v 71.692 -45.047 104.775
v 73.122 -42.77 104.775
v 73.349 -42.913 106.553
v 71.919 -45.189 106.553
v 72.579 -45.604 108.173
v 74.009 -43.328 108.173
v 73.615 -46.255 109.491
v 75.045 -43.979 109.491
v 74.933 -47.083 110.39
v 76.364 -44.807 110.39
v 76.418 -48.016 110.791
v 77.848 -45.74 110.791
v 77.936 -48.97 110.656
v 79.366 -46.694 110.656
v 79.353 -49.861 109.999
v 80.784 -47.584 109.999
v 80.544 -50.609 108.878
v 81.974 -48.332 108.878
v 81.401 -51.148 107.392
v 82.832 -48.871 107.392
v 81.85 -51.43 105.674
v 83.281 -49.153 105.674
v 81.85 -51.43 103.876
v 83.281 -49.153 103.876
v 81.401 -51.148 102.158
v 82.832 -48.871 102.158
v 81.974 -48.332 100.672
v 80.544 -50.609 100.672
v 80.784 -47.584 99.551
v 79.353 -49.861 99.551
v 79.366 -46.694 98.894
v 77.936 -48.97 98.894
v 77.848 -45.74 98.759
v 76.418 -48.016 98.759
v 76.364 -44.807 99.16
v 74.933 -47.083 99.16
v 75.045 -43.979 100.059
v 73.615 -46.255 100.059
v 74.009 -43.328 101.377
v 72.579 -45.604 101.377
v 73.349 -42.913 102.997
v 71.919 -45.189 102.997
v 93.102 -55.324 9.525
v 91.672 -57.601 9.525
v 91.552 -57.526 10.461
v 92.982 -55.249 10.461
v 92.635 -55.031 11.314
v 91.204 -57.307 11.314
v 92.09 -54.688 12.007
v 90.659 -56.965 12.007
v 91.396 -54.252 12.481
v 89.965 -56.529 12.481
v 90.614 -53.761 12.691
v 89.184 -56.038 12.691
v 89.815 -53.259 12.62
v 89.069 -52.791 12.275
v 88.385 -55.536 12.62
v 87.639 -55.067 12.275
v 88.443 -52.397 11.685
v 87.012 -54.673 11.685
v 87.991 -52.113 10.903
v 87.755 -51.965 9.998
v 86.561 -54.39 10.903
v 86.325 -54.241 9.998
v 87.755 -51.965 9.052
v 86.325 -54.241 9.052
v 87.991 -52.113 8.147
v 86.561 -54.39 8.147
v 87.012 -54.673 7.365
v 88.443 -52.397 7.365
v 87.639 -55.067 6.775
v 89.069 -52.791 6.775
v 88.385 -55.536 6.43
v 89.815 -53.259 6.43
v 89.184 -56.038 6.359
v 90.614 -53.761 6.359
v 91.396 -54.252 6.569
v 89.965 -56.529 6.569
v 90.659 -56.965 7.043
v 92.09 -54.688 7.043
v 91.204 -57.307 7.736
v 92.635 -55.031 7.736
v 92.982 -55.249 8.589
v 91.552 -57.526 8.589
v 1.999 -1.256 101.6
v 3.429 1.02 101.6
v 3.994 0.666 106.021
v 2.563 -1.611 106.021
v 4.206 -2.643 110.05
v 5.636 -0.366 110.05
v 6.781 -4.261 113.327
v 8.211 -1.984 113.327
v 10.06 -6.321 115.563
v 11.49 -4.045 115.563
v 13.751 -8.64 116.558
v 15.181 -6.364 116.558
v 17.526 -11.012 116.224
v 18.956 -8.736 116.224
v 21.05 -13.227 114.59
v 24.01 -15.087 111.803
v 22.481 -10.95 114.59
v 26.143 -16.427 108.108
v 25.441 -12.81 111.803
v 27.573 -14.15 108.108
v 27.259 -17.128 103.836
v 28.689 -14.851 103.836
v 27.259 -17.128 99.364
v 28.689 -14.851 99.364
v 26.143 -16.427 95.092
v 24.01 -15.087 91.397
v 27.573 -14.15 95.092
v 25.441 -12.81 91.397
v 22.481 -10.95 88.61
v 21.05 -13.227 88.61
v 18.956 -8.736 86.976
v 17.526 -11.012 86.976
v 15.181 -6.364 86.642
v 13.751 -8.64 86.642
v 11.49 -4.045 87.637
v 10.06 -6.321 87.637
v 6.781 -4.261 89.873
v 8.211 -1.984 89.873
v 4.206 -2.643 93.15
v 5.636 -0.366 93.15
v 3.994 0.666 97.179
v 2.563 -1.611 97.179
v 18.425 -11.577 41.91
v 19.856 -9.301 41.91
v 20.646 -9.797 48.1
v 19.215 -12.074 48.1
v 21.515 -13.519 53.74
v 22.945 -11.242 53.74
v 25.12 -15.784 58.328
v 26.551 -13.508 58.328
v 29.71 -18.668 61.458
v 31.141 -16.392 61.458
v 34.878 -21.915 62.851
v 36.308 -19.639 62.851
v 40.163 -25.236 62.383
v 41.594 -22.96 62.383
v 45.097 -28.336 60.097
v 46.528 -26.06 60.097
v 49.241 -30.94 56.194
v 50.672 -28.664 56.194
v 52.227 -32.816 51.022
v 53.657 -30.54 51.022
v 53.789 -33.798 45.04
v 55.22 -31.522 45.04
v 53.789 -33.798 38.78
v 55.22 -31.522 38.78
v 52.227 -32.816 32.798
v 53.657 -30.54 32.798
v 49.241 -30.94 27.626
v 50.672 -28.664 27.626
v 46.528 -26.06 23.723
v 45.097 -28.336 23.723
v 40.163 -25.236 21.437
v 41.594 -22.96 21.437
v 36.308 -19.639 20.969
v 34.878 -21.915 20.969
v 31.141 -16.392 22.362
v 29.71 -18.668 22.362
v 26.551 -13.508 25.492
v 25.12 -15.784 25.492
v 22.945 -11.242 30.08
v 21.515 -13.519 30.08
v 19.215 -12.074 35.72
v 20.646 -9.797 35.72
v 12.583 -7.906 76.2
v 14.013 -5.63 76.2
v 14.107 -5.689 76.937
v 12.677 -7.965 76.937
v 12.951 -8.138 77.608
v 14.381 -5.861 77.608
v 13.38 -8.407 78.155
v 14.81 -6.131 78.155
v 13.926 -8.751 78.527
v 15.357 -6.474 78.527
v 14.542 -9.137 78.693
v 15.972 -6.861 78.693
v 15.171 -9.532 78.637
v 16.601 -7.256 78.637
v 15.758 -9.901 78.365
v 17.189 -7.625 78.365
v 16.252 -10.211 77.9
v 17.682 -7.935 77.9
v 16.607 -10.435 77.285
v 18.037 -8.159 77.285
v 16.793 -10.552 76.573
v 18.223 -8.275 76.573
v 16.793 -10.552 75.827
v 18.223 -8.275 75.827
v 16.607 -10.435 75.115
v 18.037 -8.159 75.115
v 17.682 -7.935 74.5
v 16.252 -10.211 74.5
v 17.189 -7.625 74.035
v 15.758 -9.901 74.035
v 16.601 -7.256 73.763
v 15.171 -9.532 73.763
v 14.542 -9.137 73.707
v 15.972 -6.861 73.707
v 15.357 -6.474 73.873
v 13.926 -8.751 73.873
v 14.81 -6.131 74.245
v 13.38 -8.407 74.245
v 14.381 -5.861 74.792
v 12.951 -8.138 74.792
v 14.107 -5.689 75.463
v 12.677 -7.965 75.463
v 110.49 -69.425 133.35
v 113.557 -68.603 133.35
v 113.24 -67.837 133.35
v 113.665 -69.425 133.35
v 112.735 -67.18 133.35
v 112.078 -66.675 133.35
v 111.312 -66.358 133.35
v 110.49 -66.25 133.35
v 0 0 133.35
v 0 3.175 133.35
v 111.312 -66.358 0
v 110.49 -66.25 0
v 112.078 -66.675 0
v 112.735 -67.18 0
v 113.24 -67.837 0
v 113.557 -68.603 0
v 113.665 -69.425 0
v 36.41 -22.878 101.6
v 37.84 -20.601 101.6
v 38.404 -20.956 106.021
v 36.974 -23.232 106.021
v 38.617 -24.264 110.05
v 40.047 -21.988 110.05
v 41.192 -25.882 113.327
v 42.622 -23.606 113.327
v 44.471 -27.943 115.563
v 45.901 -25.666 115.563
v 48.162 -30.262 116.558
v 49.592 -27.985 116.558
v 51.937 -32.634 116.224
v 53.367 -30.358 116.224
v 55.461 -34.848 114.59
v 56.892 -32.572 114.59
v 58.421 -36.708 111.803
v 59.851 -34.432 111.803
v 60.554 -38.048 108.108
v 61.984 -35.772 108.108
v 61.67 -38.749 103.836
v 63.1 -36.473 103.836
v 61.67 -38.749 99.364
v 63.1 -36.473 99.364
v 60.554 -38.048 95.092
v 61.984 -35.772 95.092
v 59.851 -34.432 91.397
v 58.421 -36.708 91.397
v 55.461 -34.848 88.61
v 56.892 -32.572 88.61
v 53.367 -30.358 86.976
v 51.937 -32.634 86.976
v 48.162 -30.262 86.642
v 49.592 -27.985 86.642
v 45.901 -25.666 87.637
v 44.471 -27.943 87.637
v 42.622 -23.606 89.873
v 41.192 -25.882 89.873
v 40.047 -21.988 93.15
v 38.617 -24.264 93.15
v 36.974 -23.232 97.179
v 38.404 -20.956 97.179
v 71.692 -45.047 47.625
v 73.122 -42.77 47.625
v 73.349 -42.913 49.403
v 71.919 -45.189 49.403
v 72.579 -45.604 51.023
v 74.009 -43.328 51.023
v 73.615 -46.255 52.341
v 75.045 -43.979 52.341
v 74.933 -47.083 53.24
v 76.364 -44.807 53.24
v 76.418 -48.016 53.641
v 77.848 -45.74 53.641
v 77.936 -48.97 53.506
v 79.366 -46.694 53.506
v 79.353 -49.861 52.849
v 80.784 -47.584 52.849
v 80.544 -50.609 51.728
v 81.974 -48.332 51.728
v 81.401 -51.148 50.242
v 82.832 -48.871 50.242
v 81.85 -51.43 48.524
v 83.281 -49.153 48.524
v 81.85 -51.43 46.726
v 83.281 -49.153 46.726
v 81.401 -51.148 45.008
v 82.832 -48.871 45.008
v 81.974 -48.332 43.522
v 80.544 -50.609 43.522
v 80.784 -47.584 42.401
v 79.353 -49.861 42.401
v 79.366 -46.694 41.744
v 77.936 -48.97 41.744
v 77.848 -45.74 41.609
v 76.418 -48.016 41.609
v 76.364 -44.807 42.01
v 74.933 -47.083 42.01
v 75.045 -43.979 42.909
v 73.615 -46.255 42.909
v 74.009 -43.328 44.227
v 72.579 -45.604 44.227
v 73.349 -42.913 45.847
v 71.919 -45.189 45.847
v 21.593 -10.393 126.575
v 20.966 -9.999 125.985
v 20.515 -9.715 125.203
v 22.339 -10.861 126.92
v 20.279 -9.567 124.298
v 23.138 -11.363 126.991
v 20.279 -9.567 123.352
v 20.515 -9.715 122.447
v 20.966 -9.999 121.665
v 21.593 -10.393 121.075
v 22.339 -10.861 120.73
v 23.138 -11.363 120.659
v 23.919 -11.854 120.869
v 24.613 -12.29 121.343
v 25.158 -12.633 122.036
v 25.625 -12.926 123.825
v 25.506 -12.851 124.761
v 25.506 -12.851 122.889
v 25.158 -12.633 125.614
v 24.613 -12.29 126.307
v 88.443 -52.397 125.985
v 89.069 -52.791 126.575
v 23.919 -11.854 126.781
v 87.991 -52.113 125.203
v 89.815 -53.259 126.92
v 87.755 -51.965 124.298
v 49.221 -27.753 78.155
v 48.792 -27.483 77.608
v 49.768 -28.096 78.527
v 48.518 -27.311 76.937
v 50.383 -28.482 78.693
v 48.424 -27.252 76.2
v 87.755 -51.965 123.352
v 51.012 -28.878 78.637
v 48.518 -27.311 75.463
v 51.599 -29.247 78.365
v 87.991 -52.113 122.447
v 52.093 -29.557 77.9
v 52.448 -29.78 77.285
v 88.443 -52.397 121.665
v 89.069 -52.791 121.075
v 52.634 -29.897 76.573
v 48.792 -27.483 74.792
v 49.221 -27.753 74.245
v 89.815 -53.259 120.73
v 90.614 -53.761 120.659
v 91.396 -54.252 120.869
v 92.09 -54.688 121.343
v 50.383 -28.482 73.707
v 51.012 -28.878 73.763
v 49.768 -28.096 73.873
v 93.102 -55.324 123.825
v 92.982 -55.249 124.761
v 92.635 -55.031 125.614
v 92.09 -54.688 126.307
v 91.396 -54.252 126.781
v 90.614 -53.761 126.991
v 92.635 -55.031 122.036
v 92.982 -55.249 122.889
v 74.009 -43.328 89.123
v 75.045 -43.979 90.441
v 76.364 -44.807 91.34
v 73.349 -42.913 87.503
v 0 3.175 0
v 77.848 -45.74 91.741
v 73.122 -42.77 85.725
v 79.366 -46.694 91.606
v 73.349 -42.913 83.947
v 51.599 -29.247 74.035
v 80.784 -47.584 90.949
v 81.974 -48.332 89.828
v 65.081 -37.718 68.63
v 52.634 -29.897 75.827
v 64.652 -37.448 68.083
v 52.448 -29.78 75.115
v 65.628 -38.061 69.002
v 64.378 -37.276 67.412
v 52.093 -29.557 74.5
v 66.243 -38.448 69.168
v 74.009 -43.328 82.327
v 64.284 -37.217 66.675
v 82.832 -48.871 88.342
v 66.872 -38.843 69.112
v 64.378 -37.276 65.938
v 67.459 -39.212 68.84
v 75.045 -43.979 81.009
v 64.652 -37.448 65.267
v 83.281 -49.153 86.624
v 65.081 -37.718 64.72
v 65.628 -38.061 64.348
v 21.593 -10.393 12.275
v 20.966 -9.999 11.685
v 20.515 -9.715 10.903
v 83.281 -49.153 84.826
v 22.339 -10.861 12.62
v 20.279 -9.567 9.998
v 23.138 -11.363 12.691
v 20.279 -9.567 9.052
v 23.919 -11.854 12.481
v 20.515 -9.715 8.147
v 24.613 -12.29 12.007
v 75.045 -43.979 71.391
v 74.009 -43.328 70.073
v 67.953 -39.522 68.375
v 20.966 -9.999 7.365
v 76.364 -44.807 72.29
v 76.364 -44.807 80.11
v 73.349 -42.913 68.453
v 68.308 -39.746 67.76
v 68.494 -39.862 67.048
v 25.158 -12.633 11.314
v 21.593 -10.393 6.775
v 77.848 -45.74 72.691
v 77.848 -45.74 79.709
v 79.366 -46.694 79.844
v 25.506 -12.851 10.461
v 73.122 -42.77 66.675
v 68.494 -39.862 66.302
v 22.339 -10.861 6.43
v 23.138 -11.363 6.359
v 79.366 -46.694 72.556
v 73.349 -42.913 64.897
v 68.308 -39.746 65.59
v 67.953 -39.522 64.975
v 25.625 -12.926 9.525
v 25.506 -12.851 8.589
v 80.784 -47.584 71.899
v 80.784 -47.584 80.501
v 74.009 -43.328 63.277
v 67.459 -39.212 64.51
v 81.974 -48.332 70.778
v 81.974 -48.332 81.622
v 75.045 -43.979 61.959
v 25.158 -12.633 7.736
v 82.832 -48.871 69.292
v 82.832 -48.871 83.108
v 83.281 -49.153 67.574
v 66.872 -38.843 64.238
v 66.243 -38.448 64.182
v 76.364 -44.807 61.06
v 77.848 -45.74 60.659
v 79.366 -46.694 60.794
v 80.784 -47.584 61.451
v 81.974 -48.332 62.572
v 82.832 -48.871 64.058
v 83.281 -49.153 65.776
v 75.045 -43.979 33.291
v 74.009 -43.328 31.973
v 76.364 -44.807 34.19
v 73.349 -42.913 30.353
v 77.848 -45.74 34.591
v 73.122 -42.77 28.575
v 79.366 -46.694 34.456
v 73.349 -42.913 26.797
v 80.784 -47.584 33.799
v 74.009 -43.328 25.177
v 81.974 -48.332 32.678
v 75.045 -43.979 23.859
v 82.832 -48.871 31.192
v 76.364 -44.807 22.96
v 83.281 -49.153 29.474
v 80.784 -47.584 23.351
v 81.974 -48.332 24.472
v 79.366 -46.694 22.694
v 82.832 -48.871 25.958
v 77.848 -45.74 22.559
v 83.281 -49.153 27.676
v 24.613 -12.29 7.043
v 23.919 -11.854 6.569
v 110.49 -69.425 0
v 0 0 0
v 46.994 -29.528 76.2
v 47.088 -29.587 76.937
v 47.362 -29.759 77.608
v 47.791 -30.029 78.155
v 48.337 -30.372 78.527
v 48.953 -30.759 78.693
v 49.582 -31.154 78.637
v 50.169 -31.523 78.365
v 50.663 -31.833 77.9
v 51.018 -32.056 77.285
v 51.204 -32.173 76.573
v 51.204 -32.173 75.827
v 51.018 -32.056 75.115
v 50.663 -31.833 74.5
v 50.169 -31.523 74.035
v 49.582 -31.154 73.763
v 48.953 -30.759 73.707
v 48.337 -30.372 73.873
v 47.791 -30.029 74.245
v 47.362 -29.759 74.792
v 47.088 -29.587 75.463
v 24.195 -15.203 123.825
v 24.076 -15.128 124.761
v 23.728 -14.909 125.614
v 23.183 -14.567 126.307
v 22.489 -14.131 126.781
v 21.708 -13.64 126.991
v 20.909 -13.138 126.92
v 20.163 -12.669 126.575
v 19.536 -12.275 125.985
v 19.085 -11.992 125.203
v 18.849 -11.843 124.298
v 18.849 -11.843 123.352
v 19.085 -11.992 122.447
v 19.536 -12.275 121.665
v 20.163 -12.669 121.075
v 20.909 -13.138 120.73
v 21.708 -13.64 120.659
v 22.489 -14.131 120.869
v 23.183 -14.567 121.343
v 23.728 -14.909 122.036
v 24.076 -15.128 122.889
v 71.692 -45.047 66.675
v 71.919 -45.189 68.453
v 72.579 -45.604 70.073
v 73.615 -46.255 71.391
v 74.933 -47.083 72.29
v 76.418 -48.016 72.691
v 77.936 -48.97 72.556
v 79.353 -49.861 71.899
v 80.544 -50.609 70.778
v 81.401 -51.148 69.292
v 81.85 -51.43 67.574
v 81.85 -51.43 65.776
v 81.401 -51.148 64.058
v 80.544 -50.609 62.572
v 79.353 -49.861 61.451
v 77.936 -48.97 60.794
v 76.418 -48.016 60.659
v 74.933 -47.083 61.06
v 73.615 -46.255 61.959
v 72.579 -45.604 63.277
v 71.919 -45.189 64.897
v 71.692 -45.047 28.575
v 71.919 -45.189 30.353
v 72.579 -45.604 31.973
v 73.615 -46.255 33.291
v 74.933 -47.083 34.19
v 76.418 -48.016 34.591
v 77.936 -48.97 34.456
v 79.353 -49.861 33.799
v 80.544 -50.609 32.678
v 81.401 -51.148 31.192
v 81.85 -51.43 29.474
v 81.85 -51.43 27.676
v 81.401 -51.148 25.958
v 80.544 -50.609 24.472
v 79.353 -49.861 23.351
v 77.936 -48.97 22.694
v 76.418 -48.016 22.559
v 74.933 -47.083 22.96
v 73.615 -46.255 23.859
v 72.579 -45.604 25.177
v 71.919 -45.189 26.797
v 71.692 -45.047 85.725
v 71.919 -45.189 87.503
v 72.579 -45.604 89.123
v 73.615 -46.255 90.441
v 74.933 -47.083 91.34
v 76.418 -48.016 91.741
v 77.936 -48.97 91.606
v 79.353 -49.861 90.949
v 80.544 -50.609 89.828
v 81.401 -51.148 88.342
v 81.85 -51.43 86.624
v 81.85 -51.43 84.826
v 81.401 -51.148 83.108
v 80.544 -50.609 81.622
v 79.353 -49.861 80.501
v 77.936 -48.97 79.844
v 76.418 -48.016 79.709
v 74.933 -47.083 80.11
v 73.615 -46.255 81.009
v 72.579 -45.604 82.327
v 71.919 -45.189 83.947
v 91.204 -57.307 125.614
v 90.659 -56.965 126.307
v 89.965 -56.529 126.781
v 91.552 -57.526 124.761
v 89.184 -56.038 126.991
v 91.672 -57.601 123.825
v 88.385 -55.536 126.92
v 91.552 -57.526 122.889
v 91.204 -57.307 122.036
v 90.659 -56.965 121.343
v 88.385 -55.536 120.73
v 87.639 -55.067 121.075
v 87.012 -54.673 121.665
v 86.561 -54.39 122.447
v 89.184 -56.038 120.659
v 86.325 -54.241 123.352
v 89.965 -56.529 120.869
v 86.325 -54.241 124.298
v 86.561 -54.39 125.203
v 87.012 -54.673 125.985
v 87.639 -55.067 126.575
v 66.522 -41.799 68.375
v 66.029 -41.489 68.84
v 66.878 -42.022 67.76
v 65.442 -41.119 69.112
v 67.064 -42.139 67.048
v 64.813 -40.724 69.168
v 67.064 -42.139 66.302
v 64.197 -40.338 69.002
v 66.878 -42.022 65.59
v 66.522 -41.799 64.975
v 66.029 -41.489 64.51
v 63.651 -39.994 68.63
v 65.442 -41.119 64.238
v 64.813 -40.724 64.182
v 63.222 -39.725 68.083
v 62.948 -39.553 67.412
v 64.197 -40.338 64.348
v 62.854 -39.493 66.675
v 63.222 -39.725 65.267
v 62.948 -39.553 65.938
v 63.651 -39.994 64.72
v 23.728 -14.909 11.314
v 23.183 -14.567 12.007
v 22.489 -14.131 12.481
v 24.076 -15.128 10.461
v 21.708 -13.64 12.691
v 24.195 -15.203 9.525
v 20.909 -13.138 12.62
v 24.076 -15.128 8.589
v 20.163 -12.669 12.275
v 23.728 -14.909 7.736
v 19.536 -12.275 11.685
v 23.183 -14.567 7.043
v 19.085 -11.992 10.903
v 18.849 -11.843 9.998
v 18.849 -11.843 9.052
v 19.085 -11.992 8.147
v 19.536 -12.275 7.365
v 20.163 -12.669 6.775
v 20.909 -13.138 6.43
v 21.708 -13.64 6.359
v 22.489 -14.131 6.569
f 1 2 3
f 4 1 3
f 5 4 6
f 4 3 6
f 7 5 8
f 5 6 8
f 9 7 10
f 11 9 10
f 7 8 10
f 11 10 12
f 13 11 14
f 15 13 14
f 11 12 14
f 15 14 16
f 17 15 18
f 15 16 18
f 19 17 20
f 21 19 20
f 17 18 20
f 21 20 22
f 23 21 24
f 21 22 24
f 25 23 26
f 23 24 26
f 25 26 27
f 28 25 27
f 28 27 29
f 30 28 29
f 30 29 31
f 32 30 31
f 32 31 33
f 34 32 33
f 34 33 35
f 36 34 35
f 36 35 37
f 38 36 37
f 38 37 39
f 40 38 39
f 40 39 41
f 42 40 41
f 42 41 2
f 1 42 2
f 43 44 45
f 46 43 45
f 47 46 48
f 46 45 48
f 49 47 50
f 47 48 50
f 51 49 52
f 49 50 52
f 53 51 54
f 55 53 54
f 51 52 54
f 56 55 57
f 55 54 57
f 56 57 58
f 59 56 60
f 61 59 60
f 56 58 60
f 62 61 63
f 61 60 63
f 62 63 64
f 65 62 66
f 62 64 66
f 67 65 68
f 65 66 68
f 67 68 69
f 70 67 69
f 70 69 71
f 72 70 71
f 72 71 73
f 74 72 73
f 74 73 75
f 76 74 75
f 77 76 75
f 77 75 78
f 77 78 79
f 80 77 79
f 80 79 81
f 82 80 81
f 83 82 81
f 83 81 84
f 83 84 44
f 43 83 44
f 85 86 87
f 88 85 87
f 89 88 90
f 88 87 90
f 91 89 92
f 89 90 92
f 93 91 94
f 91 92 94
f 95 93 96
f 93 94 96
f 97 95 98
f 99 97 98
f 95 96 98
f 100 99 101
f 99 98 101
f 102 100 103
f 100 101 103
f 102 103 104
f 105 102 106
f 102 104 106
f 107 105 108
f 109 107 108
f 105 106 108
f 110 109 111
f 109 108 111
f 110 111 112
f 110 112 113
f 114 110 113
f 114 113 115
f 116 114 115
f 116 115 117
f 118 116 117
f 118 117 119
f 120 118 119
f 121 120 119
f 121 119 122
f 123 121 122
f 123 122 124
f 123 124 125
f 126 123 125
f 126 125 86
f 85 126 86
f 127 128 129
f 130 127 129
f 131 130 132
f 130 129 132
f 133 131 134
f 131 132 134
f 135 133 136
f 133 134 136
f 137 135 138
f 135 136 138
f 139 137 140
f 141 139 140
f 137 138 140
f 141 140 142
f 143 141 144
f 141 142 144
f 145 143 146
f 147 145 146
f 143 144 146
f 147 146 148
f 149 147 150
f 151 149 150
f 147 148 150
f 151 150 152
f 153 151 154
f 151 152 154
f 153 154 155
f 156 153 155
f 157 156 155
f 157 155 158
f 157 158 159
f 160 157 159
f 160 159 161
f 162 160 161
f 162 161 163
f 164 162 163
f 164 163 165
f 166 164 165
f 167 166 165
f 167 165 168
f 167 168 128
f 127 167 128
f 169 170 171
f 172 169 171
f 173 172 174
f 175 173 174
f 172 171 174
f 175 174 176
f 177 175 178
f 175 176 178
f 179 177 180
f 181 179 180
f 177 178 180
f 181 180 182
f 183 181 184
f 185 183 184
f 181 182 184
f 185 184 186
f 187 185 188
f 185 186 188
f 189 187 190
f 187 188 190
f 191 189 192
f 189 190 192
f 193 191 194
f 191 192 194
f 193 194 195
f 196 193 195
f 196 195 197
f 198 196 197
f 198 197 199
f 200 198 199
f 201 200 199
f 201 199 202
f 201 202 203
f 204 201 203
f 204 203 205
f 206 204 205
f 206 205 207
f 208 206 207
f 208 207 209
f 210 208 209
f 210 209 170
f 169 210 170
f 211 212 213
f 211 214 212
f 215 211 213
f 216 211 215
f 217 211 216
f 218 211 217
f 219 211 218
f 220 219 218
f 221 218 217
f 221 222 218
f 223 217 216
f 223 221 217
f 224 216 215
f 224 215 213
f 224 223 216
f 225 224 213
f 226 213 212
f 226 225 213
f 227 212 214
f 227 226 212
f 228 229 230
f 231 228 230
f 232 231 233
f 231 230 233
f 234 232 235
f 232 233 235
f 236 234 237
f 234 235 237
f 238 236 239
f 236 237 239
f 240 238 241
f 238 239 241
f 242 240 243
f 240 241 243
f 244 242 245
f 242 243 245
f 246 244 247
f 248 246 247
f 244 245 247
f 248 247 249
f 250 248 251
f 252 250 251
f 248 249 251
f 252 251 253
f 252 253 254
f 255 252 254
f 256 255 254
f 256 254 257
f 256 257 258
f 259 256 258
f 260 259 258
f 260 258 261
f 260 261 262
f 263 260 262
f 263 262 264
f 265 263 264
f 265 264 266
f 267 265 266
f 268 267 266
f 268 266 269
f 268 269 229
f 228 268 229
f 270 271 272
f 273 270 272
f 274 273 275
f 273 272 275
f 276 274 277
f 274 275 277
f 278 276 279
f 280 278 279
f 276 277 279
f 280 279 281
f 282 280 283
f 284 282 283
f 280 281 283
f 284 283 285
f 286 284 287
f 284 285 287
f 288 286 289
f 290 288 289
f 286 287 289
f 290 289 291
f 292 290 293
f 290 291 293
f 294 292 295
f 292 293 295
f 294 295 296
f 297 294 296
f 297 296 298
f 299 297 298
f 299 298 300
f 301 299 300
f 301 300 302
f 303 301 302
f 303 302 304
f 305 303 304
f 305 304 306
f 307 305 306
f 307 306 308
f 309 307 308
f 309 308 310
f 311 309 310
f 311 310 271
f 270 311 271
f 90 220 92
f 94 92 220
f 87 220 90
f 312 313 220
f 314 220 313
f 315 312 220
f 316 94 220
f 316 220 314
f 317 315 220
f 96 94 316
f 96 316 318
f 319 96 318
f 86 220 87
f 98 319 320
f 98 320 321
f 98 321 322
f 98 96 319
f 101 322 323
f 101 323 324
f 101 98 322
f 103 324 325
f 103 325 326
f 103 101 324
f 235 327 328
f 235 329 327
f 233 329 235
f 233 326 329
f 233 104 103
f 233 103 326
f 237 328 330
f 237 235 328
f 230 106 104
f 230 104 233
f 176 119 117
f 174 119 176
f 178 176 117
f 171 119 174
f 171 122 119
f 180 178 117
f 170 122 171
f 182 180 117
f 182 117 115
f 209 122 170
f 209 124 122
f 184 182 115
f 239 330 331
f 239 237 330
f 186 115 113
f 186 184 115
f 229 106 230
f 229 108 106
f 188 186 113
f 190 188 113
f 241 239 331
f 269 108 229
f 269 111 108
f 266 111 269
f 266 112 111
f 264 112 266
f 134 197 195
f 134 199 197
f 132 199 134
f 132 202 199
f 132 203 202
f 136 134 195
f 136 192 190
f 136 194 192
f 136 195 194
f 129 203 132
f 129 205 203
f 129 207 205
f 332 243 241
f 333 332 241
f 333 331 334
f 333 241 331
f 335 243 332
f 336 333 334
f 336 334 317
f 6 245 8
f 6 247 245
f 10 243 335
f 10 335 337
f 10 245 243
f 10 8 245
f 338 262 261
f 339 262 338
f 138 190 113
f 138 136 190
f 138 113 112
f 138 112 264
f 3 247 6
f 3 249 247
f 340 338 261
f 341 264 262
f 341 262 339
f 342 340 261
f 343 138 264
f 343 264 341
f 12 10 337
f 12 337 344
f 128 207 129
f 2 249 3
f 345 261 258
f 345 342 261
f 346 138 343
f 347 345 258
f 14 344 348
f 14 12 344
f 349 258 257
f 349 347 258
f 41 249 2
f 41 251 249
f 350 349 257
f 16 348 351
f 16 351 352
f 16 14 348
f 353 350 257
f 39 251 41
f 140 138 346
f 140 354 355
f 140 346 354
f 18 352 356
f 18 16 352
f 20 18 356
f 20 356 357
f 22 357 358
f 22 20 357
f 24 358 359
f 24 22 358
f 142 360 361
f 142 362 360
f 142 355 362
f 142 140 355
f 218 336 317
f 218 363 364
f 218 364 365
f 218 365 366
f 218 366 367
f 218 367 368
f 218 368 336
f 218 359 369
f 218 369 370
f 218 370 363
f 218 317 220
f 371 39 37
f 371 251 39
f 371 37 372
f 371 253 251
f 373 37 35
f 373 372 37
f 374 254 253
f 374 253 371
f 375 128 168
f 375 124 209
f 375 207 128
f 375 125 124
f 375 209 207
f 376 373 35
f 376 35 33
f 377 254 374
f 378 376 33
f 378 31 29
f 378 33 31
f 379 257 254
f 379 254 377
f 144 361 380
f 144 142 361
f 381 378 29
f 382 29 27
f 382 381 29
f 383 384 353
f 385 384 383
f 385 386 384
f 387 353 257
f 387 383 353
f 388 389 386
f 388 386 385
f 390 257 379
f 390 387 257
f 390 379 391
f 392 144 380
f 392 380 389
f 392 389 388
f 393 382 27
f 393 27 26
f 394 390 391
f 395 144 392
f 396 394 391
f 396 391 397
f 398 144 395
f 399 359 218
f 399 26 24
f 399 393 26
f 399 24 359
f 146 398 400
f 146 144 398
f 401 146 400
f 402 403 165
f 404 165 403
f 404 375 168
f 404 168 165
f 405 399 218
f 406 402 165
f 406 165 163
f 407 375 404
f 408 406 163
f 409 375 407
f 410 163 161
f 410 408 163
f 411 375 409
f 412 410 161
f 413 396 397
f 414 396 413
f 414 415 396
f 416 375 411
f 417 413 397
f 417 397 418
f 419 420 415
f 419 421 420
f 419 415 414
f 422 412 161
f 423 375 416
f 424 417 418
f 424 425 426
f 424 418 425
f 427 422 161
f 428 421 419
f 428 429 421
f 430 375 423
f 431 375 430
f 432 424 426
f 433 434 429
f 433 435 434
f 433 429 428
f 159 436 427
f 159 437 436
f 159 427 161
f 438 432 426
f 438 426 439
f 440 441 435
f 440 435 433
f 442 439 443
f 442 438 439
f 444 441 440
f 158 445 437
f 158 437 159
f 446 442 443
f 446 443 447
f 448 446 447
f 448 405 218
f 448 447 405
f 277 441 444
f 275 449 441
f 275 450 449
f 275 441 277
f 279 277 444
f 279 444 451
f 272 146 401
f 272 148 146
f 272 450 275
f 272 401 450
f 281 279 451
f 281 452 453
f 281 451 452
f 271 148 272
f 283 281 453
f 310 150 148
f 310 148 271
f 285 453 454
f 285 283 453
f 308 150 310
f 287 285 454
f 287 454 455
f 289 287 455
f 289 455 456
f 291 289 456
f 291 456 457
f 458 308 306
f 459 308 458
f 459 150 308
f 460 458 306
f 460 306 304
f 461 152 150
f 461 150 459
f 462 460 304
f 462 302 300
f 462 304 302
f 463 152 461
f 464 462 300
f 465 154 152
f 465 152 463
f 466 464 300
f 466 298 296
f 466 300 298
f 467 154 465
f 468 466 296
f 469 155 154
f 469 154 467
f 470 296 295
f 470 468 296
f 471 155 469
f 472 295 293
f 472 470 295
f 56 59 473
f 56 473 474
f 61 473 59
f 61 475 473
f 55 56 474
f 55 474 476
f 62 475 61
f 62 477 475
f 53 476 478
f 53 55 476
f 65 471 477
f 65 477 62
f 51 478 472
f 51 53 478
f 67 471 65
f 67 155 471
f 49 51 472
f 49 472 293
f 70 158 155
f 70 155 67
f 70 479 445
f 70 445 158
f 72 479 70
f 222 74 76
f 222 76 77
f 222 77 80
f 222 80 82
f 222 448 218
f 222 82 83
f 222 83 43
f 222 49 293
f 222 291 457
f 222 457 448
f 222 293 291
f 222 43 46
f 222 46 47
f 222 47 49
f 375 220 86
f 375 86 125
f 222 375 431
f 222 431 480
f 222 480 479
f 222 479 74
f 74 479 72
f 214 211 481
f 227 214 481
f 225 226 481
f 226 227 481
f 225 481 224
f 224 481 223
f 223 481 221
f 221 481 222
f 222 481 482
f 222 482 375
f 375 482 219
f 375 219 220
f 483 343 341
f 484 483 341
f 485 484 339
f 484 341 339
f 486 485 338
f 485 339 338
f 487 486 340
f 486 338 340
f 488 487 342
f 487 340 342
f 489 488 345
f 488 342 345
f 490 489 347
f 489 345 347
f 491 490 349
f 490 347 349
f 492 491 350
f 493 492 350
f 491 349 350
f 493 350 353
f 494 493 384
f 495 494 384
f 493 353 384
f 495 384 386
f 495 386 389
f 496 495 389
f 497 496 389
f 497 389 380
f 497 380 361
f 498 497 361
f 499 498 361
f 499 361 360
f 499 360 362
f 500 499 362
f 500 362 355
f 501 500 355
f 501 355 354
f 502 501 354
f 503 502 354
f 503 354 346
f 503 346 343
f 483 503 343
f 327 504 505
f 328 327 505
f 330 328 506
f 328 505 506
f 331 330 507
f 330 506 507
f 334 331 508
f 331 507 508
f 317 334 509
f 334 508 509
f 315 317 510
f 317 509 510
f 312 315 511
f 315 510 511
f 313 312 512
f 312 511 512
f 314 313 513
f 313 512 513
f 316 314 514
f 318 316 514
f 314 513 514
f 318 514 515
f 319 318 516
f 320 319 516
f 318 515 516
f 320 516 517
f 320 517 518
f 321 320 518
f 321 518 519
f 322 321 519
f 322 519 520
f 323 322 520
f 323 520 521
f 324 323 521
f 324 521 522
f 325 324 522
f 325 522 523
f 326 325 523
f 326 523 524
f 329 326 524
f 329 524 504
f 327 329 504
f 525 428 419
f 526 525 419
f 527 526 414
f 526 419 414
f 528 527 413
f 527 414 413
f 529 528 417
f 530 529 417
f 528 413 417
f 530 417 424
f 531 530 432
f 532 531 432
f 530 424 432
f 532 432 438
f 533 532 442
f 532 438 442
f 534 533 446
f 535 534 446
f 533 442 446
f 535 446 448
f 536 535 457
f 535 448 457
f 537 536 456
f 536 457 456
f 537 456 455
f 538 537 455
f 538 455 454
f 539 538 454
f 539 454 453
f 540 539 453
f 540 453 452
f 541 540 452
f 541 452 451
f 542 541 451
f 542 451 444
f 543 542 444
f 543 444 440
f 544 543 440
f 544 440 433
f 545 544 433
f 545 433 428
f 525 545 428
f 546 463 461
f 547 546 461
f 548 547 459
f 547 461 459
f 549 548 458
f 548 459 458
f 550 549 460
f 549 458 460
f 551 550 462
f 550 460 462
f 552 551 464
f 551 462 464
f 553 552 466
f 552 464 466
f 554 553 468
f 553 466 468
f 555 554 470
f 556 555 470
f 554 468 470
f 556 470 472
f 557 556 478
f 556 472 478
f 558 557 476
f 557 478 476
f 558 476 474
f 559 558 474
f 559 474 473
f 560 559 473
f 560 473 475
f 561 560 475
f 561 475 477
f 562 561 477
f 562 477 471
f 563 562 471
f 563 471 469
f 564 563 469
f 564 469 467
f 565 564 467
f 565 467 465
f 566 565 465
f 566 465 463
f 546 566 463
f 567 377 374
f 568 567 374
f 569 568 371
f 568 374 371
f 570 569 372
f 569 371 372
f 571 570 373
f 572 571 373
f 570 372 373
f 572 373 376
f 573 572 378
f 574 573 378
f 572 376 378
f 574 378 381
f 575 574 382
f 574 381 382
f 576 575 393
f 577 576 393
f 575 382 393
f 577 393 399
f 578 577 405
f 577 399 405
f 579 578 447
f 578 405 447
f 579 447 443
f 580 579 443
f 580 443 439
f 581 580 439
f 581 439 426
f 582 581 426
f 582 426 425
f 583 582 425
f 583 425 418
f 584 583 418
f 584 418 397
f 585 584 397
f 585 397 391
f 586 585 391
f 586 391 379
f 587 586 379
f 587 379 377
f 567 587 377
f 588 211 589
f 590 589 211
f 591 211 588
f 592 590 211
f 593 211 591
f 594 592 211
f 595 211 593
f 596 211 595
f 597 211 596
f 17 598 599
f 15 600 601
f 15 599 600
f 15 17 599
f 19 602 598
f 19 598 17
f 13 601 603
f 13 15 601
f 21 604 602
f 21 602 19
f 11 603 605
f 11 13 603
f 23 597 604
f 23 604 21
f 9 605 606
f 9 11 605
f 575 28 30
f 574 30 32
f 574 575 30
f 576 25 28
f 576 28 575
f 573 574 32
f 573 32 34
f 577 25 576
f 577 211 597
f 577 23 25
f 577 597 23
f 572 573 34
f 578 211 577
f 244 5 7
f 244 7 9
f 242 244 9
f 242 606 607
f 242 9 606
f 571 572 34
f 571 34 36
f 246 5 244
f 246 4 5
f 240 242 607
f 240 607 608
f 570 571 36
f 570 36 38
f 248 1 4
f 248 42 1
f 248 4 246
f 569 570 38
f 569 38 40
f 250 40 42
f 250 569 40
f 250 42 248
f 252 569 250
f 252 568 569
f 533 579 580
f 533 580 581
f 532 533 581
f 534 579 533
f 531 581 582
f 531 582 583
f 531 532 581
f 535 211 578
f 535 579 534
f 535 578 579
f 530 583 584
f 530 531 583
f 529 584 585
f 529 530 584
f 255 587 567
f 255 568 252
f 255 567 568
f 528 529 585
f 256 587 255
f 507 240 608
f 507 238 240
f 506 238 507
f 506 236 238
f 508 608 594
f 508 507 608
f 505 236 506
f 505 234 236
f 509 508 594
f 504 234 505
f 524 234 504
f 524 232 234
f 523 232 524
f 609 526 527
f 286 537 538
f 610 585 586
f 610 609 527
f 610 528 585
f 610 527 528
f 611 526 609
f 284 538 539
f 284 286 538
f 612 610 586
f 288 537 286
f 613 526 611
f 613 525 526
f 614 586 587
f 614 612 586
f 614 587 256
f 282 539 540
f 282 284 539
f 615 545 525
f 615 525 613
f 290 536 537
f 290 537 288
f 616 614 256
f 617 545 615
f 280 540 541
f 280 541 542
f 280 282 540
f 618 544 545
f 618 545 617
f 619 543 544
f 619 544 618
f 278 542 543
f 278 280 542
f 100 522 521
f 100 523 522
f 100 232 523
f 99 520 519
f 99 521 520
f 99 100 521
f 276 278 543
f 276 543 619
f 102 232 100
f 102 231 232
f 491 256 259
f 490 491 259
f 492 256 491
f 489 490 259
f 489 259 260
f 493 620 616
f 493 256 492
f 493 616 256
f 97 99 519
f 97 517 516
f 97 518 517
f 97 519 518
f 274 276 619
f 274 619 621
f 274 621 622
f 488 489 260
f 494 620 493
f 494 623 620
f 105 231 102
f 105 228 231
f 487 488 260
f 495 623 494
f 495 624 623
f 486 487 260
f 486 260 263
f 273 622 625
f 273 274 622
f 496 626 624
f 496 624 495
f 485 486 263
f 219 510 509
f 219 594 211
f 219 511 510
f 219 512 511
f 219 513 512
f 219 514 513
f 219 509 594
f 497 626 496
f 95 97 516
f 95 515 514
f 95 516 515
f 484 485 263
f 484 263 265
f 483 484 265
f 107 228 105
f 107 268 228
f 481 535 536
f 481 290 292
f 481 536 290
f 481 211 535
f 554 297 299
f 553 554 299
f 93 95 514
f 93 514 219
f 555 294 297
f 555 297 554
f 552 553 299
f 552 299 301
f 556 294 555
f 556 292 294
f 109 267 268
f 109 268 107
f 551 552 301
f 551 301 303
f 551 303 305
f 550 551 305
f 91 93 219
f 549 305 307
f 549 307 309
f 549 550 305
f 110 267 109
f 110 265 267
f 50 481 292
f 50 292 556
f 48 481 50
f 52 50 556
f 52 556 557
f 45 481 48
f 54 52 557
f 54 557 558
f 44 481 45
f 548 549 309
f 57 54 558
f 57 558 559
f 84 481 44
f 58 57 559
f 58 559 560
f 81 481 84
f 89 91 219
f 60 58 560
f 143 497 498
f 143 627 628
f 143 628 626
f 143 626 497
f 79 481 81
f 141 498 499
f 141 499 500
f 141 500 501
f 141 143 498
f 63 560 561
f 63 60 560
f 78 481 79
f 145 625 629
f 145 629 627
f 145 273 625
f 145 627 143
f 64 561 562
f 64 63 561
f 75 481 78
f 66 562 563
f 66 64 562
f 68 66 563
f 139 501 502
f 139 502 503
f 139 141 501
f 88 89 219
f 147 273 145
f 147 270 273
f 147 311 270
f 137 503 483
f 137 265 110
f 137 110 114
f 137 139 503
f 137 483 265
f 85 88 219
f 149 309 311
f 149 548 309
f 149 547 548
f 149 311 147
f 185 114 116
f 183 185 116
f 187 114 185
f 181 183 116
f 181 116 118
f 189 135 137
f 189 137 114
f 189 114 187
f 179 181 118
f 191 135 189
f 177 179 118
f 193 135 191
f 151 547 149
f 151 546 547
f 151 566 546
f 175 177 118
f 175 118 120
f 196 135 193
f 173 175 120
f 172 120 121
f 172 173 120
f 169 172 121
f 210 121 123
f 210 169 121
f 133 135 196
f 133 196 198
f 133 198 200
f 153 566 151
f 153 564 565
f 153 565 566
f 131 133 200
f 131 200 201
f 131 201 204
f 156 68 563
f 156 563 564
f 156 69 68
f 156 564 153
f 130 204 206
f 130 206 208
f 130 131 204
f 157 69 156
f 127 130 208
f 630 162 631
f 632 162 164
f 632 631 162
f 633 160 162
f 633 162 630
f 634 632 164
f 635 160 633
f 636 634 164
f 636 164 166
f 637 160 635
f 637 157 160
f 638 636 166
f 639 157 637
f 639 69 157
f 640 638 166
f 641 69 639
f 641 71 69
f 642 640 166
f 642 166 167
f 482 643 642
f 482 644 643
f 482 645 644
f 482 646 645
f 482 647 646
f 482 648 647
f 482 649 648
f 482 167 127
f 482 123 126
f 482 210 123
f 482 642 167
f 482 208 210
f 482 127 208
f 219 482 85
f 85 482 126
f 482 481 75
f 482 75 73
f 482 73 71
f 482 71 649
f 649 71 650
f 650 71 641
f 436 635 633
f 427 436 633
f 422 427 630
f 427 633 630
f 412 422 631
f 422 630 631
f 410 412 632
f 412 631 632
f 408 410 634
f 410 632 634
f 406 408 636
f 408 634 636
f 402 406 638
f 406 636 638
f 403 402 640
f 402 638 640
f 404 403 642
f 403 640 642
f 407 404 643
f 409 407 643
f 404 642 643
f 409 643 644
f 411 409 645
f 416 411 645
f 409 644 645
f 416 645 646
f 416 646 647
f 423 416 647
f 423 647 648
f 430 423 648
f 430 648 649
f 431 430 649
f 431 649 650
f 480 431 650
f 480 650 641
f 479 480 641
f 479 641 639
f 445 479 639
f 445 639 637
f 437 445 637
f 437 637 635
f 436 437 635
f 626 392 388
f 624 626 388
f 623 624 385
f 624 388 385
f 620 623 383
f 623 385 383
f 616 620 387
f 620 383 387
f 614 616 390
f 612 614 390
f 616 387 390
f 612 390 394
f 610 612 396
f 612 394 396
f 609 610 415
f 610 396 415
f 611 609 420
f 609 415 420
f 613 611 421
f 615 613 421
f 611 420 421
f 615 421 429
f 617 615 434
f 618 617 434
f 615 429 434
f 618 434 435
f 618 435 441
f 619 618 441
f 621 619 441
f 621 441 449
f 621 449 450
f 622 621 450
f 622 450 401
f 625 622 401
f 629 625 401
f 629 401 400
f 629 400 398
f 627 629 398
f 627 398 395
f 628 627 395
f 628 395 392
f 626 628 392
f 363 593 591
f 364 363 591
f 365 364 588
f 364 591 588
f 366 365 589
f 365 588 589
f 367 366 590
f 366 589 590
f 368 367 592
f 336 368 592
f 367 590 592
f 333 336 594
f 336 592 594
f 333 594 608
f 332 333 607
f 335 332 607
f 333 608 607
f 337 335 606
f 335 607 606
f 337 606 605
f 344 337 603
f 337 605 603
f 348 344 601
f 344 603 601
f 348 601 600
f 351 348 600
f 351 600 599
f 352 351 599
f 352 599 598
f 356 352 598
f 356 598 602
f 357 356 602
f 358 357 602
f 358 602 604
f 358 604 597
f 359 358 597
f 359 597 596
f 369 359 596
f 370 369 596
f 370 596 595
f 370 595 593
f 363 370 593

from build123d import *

# Parameters (mm, degrees)
BOSS_EXTRUDE1_DEPTH = 133.35
SKETCH2_R           = 21
CUT_EXTRUDE1_DEPTH  = 187.593999065
SKETCH3_W           = 133.35
SKETCH3_H           = 3.175
BOSS_EXTRUDE2_DEPTH = 3.175
FILLET1_R           = 3.175
SKETCH5_R           = 15
CUT_EXTRUDE2_DEPTH  = 189.467318942
SKETCH6_R           = 6.0325
CUT_EXTRUDE3_DEPTH  = 189.467318942
SKETCH7_R           = 3.175
CUT_EXTRUDE4_DEPTH  = 189.472240296
SKETCH15_R          = 2.5
CUT_EXTRUDE8_DEPTH  = 189.467318942
SKETCH18_R          = 30.1625
SKETCH18_R_2        = 21
BOSS_EXTRUDE3_DEPTH = 2.688354466


with BuildPart() as part:
    # Sketch1 → Boss-Extrude1 (new body)
    with BuildSketch(Plane.XY):
        Polygon((110.49, -69.425000088), (0, 0), (0, 3.175), (110.49, -66.250000088), align=None)
    extrude(amount=BOSS_EXTRUDE1_DEPTH)

    # Sketch2 → Cut-Extrude1 (cut, through all)
    with BuildSketch(Plane(origin=(1.430283892, 2.276299128, 0), x_dir=(0.8467258159330607, -0.5320295035357462, 0), z_dir=(0.5320295035357462, 0.8467258159330607, 0))):
        with Locations(Location((42.760806326, -41.91, 0), (0, 0, 180))):
            Circle(SKETCH2_R)
    extrude(amount=-CUT_EXTRUDE1_DEPTH, mode=Mode.SUBTRACT)

    # Sketch3 → Boss-Extrude2 (add)
    with BuildSketch(Plane(origin=(110.49, 0, 0), x_dir=(0, 0, -1), z_dir=(1, 0, 0))):
        with Locations((-66.675, -67.837500088)):
            Rectangle(SKETCH3_W, SKETCH3_H)
    extrude(amount=BOSS_EXTRUDE2_DEPTH)

    # Fillet1
    fillet1_edges = [part.edges().sort_by_distance(p)[0] for p in [
        (113.665, -66.250000088, 66.675),
    ]]
    fillet(fillet1_edges, radius=FILLET1_R - 0.0001)  # a hair under: the kernel refuses the full size

    # Sketch5 → Cut-Extrude2 (cut, through all)
    with BuildSketch(Plane(origin=(1.430283892, 2.276299128, 0), x_dir=(0.8467258159330606, -0.5320295035357464, 0), z_dir=(0.5320295035357464, 0.8467258159330606, 0))):
        with Locations(Location((17.360806326, -101.6, 0), (0, 0, 180))):
            Circle(SKETCH5_R)
        with Locations(Location((58.000806326, -101.6, 0), (0, 0, 180))):
            Circle(SKETCH5_R)
    extrude(amount=-CUT_EXTRUDE2_DEPTH, mode=Mode.SUBTRACT)

    # Sketch6 → Cut-Extrude3 (cut, through all)
    with BuildSketch(Plane(origin=(1.430283892, 2.276299128, 0), x_dir=(0.8467258159330606, -0.5320295035357464, 0), z_dir=(0.5320295035357464, 0.8467258159330606, 0))):
        with Locations(Location((90.701690059, -66.675, 0), (0, 0, 180))):
            Circle(SKETCH6_R)
        with Locations(Location((90.701690059, -47.625, 0), (0, 0, 180))):
            Circle(SKETCH6_R)
        with Locations(Location((90.701690059, -28.575, 0), (0, 0, 180))):
            Circle(SKETCH6_R)
        with Locations(Location((90.701690059, -85.725, 0), (0, 0, 180))):
            Circle(SKETCH6_R)
        with Locations(Location((90.701690059, -104.775, 0), (0, 0, 180))):
            Circle(SKETCH6_R)
    extrude(amount=-CUT_EXTRUDE3_DEPTH, mode=Mode.SUBTRACT)

    # Sketch7 → Cut-Extrude4 (cut, through all)
    with BuildSketch(Plane(origin=(0, 0, 0), x_dir=(0.8467258159330607, -0.5320295035357464, 0), z_dir=(-0.5320295035357463, -0.8467258159330606, 0))):
        with Locations((105.090883732, 123.825)):
            Circle(SKETCH7_R)
        with Locations((25.4, 123.825)):
            Circle(SKETCH7_R)
        with Locations((25.4, 9.525)):
            Circle(SKETCH7_R)
        with Locations((105.090883732, 9.525)):
            Circle(SKETCH7_R)
    extrude(amount=-CUT_EXTRUDE4_DEPTH, mode=Mode.SUBTRACT)

    # Sketch15 → Cut-Extrude8 (cut, through all)
    with BuildSketch(Plane(origin=(1.430283892, 2.276299128, 0), x_dir=(0.8467258159330606, -0.5320295035357464, 0), z_dir=(0.5320295035357464, 0.8467258159330606, 0))):
        with Locations(Location((17.360806326, -76.2, 0), (0, 0, 180))):
            Circle(SKETCH15_R)
        with Locations(Location((76.731690059, -66.675, 0), (0, 0, 180))):
            Circle(SKETCH15_R)
        with Locations(Location((58.000806326, -76.2, 0), (0, 0, 180))):
            Circle(SKETCH15_R)
    extrude(amount=-CUT_EXTRUDE8_DEPTH, mode=Mode.SUBTRACT)

    # Sketch18 → Boss-Extrude3 (add)
    with BuildSketch(Plane(origin=(1.430283892, 2.276299128, 0), x_dir=(0.8467258159330606, -0.5320295035357464, 0), z_dir=(0.5320295035357464, 0.8467258159330606, 0))):
        with Locations((42.760806326, -41.91)):
            Circle(SKETCH18_R)
        with Locations(Location((42.760806326, -41.91, 0), (0, 0, 180))):
            Circle(SKETCH18_R_2, mode=Mode.SUBTRACT)
    extrude(amount=-BOSS_EXTRUDE3_DEPTH)


solid = part.part
